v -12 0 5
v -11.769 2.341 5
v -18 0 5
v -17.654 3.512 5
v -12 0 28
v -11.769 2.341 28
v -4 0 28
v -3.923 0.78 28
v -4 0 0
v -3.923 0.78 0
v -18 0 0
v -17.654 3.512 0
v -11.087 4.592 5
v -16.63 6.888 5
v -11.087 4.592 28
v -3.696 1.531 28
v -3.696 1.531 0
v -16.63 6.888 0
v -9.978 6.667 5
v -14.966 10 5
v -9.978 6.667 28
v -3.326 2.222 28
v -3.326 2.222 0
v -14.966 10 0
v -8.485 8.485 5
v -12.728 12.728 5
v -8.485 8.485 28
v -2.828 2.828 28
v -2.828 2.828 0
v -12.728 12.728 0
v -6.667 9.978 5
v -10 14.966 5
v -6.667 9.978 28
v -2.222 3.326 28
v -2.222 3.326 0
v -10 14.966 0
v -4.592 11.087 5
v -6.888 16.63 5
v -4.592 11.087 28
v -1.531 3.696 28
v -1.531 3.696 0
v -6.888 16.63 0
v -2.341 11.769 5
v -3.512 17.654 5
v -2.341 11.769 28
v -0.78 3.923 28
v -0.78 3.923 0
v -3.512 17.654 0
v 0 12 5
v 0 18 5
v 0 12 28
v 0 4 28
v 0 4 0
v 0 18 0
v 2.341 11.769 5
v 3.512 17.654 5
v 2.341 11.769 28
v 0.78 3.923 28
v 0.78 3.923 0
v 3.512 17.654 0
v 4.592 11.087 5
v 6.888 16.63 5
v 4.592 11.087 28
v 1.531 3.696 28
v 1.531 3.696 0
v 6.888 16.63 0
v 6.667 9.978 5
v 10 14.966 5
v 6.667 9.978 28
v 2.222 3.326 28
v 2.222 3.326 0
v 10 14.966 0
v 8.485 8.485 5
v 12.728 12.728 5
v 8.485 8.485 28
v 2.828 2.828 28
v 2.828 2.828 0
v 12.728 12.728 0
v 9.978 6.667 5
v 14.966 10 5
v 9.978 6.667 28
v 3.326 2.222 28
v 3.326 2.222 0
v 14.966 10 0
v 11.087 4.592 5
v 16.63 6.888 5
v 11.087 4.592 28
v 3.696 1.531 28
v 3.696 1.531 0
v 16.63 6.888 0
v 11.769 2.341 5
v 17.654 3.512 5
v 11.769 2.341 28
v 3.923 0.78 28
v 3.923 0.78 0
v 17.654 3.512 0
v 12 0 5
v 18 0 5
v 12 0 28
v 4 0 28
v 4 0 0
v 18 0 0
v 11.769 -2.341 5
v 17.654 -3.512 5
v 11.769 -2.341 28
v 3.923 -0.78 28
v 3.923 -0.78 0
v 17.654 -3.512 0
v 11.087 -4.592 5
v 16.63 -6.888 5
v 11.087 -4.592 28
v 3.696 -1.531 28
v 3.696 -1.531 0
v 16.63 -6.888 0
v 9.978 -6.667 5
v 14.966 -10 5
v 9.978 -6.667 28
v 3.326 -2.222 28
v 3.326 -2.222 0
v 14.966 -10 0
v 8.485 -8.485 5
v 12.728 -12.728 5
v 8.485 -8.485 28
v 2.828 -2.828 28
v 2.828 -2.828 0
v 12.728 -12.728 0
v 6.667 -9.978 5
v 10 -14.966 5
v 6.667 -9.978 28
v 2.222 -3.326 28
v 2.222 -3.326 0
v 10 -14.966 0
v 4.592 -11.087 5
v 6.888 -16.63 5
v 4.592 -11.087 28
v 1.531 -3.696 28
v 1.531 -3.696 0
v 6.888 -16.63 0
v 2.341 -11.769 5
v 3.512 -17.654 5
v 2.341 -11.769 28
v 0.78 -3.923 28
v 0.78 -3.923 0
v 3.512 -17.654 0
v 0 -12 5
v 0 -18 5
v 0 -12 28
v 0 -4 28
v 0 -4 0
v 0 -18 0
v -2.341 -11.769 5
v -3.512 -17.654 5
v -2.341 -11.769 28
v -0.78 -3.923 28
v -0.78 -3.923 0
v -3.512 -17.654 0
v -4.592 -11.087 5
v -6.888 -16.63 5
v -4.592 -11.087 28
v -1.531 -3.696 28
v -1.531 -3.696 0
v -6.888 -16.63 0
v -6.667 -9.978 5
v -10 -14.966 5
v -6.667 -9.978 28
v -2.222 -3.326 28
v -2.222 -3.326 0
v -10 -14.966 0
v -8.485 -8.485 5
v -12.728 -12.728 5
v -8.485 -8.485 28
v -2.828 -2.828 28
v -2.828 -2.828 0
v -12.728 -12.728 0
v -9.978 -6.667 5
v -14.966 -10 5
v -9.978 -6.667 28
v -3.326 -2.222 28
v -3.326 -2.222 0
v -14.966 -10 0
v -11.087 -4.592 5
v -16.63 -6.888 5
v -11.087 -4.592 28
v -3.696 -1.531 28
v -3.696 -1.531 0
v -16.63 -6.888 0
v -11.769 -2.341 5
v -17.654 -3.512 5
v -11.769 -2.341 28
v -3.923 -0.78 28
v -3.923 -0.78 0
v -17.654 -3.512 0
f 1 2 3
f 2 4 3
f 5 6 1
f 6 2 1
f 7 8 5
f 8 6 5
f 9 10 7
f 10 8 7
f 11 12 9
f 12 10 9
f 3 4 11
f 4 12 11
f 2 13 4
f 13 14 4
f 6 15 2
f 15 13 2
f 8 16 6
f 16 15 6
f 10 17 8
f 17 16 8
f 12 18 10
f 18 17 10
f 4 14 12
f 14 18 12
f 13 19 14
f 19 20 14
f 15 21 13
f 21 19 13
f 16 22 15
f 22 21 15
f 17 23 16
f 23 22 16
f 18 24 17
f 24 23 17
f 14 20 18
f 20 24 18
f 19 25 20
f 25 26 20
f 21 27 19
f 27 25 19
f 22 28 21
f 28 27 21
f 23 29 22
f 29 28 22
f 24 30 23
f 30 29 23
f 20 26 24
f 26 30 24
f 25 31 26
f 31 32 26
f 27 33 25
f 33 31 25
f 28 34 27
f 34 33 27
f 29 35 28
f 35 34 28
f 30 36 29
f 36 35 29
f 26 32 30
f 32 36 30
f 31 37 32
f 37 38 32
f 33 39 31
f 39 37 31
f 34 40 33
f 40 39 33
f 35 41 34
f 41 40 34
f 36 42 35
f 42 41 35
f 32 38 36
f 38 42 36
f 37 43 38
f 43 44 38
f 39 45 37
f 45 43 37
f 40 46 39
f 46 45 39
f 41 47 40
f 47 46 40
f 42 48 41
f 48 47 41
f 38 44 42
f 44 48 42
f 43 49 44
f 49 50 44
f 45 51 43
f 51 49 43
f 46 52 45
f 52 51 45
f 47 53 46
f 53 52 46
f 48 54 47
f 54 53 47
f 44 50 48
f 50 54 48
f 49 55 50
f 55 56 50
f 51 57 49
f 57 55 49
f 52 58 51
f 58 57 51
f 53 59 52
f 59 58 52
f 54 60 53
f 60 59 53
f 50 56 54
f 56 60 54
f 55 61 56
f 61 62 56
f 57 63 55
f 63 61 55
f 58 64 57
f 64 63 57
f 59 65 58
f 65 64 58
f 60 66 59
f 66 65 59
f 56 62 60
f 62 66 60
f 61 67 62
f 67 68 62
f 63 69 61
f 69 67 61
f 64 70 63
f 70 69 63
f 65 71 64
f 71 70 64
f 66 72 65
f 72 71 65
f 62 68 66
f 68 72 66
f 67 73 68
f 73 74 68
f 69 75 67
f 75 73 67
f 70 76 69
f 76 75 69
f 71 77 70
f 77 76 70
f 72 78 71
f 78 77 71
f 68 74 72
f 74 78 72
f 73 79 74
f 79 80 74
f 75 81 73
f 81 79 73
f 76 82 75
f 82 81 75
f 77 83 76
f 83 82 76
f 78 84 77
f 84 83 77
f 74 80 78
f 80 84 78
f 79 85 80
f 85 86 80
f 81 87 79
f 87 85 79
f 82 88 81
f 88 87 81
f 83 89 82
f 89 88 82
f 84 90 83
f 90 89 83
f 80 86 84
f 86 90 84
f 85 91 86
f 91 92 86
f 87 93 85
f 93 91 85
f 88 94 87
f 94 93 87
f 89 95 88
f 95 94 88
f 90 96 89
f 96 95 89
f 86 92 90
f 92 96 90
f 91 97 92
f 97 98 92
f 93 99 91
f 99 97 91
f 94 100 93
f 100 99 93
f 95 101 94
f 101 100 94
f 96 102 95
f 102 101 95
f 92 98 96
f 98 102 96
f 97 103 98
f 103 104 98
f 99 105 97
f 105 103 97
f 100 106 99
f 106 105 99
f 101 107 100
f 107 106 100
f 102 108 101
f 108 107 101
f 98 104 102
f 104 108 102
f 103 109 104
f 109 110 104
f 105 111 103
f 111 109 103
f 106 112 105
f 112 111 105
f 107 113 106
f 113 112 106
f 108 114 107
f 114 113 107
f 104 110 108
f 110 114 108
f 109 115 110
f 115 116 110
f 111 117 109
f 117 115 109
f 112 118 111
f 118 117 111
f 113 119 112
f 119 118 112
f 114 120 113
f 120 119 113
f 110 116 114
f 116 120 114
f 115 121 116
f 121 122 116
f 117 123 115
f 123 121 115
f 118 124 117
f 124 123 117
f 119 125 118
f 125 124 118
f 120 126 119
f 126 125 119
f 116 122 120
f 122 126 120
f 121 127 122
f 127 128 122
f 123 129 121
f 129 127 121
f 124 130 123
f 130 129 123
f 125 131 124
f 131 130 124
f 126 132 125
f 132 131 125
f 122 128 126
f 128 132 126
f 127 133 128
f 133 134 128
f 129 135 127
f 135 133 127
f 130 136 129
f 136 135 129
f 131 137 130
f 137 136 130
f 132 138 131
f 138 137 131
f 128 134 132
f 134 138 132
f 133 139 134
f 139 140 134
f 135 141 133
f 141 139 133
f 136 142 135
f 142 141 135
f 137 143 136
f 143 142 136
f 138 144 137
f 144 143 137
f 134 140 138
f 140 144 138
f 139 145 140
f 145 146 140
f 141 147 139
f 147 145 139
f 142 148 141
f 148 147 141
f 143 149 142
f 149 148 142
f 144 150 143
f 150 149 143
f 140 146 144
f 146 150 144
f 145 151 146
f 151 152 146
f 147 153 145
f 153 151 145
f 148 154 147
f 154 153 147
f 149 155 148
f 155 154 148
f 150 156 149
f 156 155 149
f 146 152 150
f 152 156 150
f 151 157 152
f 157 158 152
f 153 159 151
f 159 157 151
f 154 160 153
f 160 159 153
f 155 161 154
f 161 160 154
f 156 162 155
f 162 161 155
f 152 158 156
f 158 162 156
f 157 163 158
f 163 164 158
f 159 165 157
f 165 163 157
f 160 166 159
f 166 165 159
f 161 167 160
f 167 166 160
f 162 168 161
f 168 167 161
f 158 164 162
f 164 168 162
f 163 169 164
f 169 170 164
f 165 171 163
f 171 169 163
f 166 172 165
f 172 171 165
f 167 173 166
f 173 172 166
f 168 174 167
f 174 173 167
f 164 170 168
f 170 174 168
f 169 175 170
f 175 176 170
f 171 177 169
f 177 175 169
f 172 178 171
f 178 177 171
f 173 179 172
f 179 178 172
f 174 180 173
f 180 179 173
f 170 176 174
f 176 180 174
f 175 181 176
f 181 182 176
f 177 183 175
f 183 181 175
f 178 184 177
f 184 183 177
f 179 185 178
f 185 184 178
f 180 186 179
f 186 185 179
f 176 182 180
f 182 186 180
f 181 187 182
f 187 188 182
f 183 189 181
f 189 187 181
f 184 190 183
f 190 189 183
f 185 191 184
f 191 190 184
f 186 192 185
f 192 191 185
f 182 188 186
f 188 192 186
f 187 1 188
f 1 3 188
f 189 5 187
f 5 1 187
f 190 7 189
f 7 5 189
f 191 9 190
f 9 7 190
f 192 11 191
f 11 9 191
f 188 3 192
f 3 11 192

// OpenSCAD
$fn = 32;

// ----------------------------------------------------------------------
// Revolved part: flanged bushing R18
// ----------------------------------------------------------------------

// --- parameters (mm) ---
bore_r = 4;               // bore radius
flange_r = 18;            // flange radius
flange_h = 5;             // flange thickness
sleeve_r = 12;            // sleeve radius
total_h = 28;             // overall height
revolve_angle = 360;      // revolve sweep, degrees
fit_tol = 0.1;            // declared fit tolerance (prompt contract)
free_tol = 0.5;           // declared free tolerance (prompt contract)

bore_d = 2 * bore_r;
flange_d = 2 * flange_r;
sleeve_d = 2 * sleeve_r;

profile = [[4, 0], [18, 0], [18, 5], [12, 5], [12, 28], [4, 28]];  // primary outline, 6 points, counter clockwise

// --- the one profile operation ---
rotate_extrude(angle = revolve_angle) polygon(points = profile);
